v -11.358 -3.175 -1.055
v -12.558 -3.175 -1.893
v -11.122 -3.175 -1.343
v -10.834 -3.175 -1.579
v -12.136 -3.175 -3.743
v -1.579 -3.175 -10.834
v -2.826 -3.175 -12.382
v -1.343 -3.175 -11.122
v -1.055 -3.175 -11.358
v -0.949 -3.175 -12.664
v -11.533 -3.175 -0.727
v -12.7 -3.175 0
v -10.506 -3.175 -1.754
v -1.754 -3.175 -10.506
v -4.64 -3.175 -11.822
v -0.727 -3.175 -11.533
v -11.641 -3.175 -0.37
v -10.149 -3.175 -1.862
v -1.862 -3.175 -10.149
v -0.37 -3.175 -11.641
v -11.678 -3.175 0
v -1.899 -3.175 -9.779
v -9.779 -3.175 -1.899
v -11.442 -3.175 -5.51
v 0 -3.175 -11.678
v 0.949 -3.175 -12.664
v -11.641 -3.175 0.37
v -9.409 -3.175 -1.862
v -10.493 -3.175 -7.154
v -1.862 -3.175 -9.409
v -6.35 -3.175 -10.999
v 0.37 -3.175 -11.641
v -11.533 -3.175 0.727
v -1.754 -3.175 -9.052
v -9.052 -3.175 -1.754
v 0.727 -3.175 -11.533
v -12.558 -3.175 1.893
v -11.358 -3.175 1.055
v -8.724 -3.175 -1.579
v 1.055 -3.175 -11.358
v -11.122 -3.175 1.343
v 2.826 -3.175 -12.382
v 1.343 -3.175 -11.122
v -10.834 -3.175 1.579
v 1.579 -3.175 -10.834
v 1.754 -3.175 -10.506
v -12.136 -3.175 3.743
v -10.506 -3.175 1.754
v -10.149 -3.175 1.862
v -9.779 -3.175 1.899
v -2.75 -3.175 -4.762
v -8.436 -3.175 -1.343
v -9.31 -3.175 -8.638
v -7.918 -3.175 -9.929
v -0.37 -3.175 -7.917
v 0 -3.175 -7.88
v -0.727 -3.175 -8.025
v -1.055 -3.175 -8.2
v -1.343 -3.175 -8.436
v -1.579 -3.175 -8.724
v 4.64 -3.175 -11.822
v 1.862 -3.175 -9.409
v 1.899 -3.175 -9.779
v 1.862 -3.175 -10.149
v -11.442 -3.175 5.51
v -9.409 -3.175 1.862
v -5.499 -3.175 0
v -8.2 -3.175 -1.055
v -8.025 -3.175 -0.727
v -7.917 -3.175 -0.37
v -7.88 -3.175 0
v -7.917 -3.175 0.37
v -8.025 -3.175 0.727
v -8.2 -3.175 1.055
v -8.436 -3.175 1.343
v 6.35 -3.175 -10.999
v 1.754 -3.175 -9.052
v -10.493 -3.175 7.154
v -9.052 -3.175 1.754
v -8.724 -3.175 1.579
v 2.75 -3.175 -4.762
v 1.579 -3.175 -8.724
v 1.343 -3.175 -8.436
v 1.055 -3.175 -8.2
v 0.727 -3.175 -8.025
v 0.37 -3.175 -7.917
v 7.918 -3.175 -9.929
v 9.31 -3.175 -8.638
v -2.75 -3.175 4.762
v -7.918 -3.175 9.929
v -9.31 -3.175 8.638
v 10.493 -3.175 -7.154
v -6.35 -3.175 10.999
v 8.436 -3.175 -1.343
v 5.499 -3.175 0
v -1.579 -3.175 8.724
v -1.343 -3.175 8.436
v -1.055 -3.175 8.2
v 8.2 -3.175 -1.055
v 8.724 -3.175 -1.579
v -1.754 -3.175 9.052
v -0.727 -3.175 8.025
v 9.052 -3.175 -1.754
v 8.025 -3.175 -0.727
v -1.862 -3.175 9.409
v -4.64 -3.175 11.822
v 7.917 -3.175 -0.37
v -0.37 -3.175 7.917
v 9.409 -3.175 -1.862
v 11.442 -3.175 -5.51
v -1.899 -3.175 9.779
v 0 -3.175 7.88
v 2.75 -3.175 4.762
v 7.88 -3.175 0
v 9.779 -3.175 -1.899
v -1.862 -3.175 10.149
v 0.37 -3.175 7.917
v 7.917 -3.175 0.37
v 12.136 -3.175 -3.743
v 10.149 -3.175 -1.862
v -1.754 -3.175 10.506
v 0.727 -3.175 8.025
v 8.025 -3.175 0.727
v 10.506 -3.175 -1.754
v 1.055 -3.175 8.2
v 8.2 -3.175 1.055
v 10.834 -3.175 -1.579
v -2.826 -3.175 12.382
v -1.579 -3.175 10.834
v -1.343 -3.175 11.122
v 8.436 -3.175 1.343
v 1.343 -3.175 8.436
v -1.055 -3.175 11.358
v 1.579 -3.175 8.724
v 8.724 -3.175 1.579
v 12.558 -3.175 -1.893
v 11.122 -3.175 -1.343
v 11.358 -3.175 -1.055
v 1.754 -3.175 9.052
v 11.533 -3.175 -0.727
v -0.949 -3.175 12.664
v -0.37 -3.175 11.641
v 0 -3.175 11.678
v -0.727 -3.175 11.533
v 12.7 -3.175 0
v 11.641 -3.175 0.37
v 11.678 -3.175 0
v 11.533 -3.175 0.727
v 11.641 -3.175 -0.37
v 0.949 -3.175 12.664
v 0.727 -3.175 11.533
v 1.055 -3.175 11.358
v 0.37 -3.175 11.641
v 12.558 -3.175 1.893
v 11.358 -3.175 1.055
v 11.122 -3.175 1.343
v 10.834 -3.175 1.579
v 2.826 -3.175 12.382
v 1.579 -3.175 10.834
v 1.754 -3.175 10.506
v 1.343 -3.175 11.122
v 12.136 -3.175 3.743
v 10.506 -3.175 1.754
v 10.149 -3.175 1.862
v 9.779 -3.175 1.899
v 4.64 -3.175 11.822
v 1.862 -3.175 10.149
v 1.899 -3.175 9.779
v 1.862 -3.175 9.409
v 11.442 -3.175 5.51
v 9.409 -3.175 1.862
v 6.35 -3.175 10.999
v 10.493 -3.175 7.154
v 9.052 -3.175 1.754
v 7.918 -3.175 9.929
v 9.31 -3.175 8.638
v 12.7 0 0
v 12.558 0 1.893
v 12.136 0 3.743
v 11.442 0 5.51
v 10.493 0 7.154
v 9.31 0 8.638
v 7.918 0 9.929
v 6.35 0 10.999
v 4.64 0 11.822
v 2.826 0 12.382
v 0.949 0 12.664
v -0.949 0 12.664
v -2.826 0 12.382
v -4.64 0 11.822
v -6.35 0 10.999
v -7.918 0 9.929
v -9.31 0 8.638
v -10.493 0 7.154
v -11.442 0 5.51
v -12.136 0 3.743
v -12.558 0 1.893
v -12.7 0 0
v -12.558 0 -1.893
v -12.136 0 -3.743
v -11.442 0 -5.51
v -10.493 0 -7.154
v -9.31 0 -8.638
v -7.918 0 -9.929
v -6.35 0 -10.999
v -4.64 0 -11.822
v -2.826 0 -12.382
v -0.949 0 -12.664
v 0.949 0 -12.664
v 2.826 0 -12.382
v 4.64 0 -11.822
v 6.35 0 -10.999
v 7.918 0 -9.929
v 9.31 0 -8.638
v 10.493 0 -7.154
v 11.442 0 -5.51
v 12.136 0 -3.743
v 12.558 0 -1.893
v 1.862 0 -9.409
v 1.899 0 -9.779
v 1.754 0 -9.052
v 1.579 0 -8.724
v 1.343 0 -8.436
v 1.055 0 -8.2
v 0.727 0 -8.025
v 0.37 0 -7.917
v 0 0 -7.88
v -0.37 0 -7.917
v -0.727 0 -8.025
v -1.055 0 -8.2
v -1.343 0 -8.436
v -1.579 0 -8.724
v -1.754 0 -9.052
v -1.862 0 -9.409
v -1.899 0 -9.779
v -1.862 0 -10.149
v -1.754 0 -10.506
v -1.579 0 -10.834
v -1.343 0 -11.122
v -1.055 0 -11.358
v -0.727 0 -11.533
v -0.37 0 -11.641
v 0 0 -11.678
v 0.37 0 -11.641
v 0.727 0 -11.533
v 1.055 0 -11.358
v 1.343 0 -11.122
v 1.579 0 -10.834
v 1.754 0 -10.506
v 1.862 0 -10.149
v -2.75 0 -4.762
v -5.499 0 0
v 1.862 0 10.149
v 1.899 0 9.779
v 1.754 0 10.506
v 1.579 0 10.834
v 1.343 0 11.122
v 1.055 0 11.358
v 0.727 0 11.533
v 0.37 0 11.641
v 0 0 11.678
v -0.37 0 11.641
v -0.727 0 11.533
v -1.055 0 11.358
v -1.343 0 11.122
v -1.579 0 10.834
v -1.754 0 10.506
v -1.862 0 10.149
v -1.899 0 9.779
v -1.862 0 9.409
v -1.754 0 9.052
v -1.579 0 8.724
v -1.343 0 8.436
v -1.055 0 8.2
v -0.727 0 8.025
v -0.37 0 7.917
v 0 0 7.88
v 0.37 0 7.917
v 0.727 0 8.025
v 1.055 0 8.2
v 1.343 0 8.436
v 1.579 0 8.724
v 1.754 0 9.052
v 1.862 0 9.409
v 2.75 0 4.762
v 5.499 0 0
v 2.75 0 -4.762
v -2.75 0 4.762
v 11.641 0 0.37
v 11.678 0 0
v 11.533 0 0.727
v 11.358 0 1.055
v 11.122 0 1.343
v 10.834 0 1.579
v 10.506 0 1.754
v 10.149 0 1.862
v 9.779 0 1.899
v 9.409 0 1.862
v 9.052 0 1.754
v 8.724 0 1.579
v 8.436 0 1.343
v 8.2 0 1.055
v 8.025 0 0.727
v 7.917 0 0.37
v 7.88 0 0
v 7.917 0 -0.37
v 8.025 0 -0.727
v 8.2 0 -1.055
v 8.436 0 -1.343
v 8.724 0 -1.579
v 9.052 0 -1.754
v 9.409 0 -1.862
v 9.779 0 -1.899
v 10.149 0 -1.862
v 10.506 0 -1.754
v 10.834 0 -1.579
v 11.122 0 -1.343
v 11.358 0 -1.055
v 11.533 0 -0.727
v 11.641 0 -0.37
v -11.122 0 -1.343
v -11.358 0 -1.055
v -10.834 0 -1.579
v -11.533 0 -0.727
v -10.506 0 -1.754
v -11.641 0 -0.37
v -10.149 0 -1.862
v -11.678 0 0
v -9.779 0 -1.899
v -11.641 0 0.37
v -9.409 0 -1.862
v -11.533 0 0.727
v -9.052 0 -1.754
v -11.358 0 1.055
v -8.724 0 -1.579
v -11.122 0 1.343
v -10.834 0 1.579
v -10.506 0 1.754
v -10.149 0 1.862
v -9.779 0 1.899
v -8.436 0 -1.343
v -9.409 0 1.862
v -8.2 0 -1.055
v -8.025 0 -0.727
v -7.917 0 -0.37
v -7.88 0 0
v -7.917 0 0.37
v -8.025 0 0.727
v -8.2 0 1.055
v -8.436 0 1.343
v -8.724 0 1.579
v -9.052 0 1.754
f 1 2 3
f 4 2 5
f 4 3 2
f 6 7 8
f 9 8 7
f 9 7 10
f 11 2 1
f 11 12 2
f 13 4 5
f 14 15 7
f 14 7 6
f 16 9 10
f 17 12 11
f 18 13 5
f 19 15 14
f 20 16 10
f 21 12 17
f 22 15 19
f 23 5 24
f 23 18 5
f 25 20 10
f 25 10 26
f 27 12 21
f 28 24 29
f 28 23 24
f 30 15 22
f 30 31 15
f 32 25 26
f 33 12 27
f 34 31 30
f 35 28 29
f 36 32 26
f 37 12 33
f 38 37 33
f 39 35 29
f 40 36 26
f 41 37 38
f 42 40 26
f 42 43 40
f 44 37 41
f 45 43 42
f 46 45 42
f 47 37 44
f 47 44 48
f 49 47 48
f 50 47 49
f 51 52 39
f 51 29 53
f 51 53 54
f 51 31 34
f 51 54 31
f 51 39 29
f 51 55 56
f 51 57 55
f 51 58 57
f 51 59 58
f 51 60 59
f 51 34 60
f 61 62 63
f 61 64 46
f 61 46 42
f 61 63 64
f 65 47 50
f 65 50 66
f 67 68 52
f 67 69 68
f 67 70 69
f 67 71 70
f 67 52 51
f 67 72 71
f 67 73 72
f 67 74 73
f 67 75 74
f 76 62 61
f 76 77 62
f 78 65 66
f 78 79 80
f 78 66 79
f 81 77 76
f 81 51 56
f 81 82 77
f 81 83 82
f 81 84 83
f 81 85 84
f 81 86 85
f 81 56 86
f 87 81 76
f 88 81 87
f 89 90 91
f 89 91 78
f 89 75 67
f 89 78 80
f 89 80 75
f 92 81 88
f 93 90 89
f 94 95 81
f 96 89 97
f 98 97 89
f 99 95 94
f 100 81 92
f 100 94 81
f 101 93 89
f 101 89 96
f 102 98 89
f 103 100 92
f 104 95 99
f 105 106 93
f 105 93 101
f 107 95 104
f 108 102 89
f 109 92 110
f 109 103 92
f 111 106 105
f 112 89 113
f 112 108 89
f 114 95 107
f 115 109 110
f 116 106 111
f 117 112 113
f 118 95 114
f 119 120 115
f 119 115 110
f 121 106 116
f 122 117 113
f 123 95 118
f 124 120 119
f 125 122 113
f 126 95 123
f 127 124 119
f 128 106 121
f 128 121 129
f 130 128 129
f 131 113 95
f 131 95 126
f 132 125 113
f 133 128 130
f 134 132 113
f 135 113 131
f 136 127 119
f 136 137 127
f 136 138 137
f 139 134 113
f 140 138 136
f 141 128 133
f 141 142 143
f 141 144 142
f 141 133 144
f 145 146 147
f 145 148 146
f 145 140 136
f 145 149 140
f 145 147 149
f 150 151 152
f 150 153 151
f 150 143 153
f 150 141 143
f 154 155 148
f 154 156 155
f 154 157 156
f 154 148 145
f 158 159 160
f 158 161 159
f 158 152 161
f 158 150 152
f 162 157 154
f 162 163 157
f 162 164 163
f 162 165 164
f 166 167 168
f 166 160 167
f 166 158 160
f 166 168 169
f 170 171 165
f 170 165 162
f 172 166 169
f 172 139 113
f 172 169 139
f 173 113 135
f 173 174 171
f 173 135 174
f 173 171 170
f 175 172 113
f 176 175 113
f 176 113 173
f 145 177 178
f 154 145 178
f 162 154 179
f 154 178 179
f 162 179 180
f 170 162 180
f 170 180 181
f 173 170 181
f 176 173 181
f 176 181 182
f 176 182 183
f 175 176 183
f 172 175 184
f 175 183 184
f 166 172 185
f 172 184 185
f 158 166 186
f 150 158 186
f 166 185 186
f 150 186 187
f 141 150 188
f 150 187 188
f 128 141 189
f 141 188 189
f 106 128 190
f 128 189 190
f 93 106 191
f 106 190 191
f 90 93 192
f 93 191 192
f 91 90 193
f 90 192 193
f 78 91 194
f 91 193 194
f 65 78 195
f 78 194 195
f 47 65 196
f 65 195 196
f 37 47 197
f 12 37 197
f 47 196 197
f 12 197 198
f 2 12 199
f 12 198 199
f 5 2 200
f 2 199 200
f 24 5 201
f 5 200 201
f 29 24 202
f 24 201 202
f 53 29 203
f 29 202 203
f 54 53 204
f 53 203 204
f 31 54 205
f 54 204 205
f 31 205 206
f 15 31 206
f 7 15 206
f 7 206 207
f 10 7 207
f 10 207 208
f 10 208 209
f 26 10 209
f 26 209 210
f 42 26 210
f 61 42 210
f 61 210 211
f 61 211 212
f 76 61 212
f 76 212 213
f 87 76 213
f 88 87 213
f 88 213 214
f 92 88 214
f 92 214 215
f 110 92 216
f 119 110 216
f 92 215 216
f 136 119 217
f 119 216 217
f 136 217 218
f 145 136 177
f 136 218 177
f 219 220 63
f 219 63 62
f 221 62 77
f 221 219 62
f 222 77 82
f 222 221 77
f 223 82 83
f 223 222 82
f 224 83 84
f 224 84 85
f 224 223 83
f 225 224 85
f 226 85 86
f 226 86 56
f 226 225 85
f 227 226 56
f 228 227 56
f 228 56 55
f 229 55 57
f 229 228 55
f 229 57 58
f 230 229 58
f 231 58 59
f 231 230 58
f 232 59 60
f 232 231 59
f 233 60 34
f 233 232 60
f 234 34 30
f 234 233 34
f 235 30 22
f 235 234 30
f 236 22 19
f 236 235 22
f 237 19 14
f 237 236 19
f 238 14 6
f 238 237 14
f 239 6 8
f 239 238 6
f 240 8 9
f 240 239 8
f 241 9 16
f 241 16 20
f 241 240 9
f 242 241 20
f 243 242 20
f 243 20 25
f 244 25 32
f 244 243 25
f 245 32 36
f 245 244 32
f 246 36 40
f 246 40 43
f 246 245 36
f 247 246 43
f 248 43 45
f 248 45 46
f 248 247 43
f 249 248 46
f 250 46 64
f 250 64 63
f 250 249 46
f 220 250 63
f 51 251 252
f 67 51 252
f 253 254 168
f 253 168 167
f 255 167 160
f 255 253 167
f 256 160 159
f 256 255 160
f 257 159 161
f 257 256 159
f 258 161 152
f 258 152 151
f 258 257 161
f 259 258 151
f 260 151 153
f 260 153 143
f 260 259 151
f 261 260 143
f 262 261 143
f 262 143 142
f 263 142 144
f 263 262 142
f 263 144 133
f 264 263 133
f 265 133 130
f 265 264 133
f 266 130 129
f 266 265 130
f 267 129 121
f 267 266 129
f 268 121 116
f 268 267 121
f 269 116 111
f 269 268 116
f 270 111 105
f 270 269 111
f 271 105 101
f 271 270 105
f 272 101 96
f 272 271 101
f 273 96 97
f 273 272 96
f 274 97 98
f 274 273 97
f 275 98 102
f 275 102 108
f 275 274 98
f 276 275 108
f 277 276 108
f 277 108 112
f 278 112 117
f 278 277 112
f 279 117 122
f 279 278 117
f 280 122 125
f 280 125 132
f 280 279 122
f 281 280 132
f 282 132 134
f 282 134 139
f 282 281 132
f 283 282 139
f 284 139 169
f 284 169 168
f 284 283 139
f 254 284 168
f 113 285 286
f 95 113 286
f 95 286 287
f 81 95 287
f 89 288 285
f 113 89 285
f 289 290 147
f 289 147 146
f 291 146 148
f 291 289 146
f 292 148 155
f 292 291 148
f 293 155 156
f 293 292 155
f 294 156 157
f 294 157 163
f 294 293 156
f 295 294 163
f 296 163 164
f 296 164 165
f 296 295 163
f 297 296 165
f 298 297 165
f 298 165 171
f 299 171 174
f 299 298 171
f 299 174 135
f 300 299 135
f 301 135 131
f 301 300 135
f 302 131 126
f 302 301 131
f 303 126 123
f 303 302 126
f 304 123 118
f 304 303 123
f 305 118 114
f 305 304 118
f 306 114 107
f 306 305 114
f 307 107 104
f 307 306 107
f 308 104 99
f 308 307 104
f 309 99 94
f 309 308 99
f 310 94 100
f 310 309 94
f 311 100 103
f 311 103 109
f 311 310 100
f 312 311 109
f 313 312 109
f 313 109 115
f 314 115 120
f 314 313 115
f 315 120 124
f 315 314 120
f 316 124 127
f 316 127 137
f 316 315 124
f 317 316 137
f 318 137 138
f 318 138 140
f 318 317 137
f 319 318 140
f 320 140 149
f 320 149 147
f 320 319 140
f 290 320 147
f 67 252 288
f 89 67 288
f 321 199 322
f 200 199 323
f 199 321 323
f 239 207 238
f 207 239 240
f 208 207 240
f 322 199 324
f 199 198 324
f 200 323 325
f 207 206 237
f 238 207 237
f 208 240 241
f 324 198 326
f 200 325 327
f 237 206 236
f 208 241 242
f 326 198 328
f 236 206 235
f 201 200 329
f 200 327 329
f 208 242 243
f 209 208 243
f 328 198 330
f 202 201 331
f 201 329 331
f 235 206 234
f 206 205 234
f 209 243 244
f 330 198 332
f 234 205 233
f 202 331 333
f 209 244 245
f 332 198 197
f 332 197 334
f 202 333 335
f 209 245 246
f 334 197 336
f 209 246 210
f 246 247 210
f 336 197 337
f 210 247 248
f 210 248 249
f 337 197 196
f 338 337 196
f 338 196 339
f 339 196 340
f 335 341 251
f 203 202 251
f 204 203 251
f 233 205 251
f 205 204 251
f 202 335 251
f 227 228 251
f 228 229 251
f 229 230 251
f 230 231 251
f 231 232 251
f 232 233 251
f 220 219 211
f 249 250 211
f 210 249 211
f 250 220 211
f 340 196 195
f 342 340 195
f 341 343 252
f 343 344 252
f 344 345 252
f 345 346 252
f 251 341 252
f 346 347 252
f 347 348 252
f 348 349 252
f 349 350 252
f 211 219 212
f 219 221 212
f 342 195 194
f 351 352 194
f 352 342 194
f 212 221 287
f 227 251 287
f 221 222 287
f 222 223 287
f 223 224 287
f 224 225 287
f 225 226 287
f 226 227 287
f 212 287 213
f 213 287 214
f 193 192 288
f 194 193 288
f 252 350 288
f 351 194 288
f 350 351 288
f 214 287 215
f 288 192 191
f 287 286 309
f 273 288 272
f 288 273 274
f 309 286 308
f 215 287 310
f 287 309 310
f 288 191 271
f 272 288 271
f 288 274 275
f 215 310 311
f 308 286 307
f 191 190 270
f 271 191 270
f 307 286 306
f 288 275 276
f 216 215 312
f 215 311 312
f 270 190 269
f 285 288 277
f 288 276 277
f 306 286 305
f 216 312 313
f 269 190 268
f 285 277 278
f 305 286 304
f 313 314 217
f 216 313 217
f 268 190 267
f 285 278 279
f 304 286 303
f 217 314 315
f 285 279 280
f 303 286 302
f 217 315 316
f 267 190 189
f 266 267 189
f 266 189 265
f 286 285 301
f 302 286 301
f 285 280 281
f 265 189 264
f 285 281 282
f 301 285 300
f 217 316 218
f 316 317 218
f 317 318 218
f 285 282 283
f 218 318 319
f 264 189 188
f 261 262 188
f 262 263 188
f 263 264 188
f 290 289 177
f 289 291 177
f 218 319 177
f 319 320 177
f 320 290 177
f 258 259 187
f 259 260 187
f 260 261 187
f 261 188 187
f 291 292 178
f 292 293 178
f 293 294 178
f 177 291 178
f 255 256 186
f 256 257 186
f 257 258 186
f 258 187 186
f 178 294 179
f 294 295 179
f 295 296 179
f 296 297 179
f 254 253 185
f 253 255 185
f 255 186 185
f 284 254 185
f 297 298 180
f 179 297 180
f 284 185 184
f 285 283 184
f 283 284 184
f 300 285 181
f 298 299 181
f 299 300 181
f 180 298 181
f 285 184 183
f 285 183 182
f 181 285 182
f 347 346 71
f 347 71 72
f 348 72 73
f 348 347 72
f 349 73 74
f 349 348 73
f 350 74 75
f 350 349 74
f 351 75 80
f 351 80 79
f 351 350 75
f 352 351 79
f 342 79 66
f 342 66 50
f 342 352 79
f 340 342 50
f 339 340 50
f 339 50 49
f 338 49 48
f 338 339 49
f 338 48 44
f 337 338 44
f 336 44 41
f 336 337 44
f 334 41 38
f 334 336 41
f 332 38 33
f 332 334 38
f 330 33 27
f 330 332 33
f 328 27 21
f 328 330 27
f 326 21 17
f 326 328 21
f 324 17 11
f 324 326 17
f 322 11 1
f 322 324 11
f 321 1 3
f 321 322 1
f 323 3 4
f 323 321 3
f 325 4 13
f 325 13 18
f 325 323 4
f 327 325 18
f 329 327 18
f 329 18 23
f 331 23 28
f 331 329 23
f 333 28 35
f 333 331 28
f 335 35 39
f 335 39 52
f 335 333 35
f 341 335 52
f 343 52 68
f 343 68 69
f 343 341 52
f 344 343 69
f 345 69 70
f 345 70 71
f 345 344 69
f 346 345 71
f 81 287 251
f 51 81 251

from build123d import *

# Parameters (mm, degrees)
F0_R     = 12.7
F0_R_2   = 1.89865
F1_DEPTH = 3.175


with BuildPart() as f1:
    # F0 (on Front) → F1 (new body)
    with BuildSketch(Plane.XZ):
        Circle(F0_R)
        with Locations((0, -9.779)):
            Circle(F0_R_2, mode=Mode.SUBTRACT)
        with Locations((-9.779, 0)):
            Circle(F0_R_2, mode=Mode.SUBTRACT)
        Polygon((-5.499261, 0), (-2.749631, 4.7625), (2.749631, 4.7625), (5.499261, 0), (2.749631, -4.7625), (-2.749631, -4.7625), align=None, mode=Mode.SUBTRACT)
        with Locations((9.779, 0)):
            Circle(F0_R_2, mode=Mode.SUBTRACT)
        with Locations((0, 9.779)):
            Circle(F0_R_2, mode=Mode.SUBTRACT)
    extrude(amount=F1_DEPTH)


solid = f1.part
